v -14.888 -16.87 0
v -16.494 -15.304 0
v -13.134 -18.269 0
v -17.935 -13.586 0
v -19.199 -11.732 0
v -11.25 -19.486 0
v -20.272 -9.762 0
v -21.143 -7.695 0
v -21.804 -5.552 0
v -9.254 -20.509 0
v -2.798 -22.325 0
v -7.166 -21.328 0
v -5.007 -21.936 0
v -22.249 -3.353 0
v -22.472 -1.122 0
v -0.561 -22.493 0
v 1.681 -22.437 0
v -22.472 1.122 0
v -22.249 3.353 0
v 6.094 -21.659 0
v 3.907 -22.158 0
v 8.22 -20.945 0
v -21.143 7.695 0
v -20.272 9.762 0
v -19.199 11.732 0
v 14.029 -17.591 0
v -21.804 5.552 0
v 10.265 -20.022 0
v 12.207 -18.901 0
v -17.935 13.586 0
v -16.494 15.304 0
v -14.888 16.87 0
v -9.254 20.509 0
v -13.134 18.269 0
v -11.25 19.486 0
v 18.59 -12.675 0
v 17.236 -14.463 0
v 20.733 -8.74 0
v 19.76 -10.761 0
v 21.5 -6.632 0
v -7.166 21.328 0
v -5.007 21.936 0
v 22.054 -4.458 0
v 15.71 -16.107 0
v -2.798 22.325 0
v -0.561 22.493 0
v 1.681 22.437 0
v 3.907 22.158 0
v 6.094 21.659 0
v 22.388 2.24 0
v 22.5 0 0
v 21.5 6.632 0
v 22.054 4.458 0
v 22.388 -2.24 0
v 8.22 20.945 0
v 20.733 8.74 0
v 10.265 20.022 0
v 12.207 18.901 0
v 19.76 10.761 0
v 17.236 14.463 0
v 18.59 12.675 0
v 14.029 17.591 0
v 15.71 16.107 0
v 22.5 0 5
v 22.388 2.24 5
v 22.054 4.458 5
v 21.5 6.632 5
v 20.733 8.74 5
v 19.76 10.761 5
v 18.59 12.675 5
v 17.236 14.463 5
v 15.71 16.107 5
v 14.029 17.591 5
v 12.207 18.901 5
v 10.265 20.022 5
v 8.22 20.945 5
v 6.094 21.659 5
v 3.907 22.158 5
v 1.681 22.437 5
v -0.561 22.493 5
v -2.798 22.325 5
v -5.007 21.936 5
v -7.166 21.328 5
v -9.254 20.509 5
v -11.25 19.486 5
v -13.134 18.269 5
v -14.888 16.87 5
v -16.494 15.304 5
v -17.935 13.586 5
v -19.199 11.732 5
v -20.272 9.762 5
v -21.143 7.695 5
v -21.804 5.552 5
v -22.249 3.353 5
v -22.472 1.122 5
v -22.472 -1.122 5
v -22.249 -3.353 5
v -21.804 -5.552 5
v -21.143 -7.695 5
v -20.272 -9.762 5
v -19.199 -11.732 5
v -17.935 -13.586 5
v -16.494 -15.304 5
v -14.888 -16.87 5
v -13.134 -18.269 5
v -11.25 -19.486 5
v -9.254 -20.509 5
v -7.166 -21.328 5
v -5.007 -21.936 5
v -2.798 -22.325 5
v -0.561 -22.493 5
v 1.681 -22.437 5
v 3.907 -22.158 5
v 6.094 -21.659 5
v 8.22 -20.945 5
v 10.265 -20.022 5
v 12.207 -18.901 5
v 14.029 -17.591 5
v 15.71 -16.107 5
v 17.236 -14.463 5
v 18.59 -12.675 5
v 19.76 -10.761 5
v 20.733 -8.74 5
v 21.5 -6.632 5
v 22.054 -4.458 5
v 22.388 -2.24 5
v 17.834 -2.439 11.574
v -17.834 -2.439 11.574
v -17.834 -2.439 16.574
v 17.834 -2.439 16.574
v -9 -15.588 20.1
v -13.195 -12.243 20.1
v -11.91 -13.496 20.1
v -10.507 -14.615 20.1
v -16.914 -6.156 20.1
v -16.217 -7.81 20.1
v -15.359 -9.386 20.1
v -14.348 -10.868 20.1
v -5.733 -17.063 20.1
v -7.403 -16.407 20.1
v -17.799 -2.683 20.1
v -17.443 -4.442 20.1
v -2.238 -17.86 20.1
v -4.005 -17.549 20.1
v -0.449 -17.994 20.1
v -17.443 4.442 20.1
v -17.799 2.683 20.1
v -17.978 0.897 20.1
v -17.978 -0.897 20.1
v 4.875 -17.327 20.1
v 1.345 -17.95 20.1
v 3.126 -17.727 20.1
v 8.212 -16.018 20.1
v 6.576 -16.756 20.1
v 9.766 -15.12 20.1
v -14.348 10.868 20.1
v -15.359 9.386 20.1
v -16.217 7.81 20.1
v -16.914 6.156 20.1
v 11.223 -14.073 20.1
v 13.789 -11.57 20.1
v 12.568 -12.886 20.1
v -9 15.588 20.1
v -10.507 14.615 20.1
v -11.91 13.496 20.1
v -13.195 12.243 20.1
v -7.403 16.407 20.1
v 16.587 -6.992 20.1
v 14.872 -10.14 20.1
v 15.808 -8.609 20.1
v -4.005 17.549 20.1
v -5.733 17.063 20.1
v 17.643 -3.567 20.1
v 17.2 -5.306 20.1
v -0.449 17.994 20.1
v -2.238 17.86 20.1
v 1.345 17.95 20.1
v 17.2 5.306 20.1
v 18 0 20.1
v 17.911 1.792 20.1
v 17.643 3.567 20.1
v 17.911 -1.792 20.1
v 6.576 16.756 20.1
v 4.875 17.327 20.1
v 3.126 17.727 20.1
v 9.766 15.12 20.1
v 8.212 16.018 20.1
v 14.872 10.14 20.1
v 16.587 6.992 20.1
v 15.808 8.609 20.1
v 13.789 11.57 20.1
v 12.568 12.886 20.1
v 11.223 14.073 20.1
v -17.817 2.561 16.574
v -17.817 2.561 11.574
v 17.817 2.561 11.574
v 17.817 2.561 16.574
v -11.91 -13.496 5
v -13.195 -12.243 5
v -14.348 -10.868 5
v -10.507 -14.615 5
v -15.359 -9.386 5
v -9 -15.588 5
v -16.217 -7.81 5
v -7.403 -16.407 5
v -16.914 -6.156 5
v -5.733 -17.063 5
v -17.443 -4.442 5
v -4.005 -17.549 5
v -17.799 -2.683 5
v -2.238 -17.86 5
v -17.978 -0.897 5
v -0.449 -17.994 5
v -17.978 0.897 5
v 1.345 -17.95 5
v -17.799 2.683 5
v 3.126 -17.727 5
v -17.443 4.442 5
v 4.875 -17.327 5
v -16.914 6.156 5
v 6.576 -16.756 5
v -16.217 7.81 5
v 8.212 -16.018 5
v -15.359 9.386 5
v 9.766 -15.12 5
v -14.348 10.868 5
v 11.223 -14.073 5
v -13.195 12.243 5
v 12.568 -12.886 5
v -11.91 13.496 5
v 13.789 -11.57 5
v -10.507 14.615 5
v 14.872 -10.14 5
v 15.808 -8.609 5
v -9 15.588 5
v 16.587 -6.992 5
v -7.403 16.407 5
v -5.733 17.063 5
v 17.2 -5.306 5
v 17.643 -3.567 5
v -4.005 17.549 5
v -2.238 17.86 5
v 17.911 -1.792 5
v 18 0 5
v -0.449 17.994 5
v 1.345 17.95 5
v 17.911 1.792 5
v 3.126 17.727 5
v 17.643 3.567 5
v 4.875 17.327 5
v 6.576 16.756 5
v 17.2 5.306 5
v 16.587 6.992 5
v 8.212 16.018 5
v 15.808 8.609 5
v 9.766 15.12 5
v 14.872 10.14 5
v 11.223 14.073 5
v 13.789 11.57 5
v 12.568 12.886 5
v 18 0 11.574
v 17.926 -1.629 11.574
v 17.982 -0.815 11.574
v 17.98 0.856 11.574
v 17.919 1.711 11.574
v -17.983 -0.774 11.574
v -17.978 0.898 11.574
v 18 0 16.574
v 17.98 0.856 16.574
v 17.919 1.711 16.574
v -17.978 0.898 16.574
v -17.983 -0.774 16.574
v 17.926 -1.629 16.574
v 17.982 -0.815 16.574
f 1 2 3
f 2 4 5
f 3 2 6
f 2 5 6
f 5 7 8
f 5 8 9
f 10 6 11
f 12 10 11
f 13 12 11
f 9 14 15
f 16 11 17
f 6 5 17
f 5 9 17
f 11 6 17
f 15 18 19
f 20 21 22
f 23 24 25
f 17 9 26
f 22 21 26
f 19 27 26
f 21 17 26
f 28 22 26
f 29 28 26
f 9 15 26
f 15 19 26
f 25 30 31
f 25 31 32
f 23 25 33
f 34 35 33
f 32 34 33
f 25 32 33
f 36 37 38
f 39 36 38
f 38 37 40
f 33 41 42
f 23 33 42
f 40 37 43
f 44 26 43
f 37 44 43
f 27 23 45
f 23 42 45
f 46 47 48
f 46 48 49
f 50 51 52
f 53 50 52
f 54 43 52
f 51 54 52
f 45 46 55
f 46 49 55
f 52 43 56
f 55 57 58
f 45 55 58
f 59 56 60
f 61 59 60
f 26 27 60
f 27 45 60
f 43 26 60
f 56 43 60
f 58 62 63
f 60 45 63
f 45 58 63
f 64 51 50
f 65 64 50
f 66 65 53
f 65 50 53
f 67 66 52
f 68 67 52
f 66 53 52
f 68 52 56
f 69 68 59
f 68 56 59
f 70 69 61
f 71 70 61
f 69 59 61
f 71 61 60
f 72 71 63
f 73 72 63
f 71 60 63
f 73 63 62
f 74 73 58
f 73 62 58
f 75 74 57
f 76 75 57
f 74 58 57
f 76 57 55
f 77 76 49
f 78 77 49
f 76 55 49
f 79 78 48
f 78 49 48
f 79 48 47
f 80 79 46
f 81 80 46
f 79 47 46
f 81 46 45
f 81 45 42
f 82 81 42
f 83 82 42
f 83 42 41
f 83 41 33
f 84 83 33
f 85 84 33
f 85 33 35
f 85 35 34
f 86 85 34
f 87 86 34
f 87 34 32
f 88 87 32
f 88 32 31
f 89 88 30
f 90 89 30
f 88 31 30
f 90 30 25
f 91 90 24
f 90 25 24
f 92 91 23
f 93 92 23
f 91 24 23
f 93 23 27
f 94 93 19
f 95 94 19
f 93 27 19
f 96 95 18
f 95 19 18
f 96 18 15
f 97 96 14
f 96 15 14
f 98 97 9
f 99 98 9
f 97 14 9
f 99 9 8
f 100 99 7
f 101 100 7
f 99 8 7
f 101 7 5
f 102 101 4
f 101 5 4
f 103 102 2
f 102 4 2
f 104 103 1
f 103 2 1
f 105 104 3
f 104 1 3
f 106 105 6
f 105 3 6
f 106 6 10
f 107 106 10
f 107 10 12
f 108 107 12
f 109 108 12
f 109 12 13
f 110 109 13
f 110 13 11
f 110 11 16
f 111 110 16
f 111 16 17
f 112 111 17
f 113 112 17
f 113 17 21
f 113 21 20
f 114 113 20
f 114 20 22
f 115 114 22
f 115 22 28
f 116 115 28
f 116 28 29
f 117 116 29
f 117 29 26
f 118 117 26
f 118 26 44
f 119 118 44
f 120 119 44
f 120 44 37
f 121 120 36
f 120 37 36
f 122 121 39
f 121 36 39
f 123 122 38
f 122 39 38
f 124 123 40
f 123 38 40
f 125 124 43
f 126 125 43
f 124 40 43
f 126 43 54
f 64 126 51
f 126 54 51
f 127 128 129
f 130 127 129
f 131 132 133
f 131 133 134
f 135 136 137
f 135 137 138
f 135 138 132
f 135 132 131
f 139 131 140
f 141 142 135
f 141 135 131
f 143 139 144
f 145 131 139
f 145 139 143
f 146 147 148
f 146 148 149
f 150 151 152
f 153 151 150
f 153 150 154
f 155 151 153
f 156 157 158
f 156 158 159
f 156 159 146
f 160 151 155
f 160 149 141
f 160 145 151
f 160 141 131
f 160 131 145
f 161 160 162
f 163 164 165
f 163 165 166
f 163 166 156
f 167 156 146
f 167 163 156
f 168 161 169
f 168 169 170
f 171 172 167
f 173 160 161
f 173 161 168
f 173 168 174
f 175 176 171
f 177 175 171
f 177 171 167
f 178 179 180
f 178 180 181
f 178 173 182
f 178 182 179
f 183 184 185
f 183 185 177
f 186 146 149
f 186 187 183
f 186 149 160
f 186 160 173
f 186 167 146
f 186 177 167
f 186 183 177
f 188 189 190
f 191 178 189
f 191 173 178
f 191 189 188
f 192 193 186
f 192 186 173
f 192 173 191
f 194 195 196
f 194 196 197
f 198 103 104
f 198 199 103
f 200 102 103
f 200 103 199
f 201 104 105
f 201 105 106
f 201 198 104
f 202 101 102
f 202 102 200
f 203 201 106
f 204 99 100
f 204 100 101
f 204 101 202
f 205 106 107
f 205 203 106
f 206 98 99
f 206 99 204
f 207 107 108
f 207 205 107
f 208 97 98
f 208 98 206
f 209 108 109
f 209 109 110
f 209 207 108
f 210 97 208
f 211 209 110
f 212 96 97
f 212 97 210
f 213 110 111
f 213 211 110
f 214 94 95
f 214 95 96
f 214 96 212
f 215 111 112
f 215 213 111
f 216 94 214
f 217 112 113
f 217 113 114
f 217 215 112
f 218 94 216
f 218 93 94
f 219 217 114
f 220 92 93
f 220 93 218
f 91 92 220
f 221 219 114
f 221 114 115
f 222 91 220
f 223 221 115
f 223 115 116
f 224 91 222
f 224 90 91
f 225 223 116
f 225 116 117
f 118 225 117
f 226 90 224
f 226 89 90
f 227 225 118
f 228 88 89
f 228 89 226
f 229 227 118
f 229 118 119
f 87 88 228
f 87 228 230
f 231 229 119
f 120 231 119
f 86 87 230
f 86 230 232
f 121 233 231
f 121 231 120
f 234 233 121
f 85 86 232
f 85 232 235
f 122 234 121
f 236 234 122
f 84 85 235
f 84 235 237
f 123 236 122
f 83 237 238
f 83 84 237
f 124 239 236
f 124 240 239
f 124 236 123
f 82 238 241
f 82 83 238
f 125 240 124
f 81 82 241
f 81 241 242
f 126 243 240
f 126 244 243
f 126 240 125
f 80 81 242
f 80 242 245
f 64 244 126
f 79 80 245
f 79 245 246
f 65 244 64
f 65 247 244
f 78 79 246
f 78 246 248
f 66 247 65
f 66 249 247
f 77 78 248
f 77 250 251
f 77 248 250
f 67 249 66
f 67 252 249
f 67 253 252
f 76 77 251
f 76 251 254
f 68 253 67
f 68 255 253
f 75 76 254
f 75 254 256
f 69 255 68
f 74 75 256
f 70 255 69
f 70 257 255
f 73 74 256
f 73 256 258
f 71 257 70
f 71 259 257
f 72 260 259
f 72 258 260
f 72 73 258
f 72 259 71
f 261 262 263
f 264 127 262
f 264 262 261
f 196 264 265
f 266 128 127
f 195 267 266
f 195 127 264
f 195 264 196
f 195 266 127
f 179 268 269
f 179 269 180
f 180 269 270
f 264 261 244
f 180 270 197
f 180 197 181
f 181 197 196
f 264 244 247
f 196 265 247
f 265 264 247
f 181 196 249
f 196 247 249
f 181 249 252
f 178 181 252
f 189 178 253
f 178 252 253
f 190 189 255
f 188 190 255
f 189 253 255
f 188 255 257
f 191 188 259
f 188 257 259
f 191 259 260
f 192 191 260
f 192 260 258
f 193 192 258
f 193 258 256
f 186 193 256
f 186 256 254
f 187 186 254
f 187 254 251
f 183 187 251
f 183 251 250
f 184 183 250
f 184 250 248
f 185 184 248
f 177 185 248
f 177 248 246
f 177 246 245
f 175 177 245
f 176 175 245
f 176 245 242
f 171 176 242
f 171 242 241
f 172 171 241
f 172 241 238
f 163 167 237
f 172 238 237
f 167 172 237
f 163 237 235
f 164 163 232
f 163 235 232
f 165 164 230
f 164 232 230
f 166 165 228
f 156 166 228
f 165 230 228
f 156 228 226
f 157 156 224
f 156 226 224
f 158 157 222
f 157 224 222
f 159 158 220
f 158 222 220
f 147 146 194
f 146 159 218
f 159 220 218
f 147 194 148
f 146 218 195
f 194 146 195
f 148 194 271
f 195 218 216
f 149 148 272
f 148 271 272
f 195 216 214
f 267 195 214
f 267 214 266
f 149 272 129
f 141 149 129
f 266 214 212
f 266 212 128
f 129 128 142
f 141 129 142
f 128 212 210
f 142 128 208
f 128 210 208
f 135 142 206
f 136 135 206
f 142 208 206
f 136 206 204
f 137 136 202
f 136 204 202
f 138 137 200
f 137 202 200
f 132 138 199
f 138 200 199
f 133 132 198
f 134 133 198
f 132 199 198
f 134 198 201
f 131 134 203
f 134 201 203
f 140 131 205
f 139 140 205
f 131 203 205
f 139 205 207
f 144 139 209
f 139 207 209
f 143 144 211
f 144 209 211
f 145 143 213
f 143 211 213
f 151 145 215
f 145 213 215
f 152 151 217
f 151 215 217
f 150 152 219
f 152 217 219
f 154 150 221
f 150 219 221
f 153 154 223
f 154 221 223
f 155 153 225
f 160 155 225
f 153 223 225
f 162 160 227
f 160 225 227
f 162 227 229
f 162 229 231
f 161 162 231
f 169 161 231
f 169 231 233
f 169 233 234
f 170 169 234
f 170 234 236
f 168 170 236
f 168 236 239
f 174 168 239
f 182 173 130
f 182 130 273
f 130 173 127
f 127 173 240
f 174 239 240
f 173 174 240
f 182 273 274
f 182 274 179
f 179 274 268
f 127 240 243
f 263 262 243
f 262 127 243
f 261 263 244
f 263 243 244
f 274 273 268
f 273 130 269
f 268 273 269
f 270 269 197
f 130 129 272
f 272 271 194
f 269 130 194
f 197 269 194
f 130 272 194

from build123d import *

# Parameters (mm, degrees)
F0_R          = 18
F0_R_2        = 16
F1_DEPTH      = 20.1
F0_R_3        = 22.5
F2_DEPTH      = 5
F3_W          = 5
F3_H          = 5
F4_DEPTH      = 25
F4_DEPTH_BACK = 25


with BuildPart() as f1:
    # F0 (on Top) → F1 (new body)
    with BuildSketch(Plane.XY):
        Circle(F0_R)
        Circle(F0_R_2, mode=Mode.SUBTRACT)
        Circle(F0_R_2)
    extrude(amount=F1_DEPTH)

    # F0 (on Top) → F2 (join)
    with BuildSketch(Plane.XY):
        Circle(F0_R_3)
        Circle(F0_R, mode=Mode.SUBTRACT)
    extrude(amount=F2_DEPTH)

    # F3 (on Right) → F4 (cut, two sides)
    with BuildSketch(Plane.YZ) as f4_sk:
        with Locations((0.061292029, 14.0744583309)):
            Rectangle(F3_W, F3_H)
    extrude(amount=F4_DEPTH, mode=Mode.SUBTRACT)
    extrude(f4_sk.sketch, amount=-F4_DEPTH_BACK, mode=Mode.SUBTRACT)


solid = f1.part
